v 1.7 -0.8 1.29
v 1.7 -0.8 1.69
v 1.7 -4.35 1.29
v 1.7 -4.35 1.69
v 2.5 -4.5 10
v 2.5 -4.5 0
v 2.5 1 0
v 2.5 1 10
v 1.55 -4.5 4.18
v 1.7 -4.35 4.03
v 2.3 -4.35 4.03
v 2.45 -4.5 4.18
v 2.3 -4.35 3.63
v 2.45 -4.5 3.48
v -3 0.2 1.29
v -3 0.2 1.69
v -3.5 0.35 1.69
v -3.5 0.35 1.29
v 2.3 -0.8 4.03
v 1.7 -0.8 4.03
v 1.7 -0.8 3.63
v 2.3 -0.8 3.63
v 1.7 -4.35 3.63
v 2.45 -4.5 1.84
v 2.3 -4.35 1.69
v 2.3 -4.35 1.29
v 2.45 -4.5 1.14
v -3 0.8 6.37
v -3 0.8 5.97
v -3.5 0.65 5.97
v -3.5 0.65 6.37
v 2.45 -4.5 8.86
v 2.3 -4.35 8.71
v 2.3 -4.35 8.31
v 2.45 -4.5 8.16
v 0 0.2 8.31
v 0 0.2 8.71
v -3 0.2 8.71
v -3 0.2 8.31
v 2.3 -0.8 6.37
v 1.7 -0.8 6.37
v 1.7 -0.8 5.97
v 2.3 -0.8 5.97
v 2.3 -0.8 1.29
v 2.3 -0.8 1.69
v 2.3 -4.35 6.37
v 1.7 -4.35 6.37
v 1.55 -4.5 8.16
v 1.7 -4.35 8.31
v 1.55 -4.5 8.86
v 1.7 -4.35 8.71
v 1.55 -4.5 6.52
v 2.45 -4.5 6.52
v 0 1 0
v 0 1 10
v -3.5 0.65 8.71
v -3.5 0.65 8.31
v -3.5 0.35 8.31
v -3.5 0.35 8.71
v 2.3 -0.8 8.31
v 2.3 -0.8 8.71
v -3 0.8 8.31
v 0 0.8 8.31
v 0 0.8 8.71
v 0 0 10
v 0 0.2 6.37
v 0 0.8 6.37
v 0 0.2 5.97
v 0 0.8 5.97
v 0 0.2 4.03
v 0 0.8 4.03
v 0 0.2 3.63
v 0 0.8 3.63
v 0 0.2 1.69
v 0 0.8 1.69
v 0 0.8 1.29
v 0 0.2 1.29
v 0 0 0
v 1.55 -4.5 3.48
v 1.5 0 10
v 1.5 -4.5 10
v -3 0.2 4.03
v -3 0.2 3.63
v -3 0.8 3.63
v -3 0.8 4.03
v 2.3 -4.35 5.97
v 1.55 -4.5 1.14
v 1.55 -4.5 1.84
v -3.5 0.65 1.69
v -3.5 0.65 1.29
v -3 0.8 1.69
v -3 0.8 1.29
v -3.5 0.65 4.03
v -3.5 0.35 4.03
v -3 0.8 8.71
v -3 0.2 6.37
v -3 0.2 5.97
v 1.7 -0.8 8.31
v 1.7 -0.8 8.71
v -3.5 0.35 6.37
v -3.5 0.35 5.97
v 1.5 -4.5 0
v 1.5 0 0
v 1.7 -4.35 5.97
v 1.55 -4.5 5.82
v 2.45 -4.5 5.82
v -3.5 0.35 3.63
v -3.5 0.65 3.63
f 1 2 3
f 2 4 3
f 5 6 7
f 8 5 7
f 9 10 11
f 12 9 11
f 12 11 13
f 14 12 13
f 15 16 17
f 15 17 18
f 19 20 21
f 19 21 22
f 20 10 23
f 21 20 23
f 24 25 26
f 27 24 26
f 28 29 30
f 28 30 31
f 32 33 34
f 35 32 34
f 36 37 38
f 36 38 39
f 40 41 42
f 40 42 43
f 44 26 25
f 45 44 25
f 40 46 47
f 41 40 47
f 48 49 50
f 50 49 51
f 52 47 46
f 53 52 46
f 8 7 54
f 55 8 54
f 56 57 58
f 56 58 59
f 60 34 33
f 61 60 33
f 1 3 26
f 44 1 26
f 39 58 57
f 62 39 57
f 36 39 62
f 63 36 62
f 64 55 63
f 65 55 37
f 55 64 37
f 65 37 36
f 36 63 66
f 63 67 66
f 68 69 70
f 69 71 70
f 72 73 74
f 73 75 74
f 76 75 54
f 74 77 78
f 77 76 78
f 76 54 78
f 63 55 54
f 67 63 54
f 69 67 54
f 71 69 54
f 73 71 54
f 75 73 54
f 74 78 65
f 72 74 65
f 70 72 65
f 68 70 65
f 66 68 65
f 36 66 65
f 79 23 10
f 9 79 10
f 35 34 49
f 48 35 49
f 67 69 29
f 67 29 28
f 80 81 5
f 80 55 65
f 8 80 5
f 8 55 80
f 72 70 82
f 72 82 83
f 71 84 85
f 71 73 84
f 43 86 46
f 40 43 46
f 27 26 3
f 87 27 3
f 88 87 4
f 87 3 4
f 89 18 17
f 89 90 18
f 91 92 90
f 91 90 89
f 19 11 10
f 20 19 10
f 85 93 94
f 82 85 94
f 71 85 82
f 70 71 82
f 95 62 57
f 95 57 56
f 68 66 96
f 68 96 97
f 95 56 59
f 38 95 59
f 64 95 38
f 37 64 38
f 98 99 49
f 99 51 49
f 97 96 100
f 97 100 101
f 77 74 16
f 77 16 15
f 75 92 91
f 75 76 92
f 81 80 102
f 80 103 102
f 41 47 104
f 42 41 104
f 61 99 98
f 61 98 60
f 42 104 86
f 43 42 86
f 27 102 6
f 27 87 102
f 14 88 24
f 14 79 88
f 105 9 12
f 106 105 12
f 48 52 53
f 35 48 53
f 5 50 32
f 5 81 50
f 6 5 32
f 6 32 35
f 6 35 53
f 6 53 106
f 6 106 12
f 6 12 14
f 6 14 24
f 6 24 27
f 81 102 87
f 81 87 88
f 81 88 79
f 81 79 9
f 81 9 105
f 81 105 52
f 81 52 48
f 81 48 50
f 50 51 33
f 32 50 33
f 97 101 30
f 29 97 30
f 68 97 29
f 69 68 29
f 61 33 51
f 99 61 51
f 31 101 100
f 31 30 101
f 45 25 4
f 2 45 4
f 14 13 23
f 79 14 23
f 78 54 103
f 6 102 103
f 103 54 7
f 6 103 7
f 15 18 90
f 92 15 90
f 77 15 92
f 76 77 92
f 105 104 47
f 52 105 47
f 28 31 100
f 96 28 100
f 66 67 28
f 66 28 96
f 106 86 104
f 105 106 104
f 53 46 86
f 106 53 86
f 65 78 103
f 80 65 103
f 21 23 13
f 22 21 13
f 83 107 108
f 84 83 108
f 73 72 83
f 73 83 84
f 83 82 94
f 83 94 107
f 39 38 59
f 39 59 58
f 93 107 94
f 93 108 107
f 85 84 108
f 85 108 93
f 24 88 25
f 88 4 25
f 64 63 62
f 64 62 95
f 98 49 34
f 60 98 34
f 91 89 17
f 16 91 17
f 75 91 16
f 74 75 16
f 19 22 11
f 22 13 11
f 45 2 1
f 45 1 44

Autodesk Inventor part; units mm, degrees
ref_plane "YZ Plane" through (0, 0, 0) normal (1, 0, 0) x (0, 1, 0)
ref_plane "XZ Plane" through (0, 0, 0) normal (0, 1, 0) x (-1, 0, 0)
ref_plane "XY Plane" through (0, 0, 0) normal (0, 0, 1) x (1, 0, 0)
sketch "Sketch4" plane through (0, 0, 0) normal (0, 0, 1) x (1, 0, 0)
  line L0 (0, 0) -> (1.5, 0)
  line L1 (1.5, 0) -> (1.5, -1)
  line L2 (1.5, -1) -> (2.5, -1)
  line L3 (2.5, -1) -> (2.5, 1)
  line L4 (2.5, 1) -> (0, 1)
  line L5 (0, 1) -> (0, 0)
  dimension "d22" = 1.5
  dimension "d23" = 1
  dimension "d24" = 1
  dimension "d25" = 2
extrude "Extrusion4" add sketch "Sketch4" along normal blind 10
sketch "Sketch5" plane through (1.5, -1, 0) normal (0, -1, 0) x (1, 0, 0)
  line L0 (0, 0) -> (1, 0) projected
  line L1 (1, 0) -> (1, 10) projected
  line L2 (0, 10) -> (1, 10) projected
  line L3 (0, 0) -> (0, 10) projected
  point P0 (-1.5, 0)
extrude "Extrusion5" add sketch "Sketch5" along normal blind 3.5
sketch "Sketch6" plane through (0, 0, 0) normal (-1, 0, 0) x (0, 0, 1)
  line L0 (0, 0) -> (10, 0) projected
  line L1 (1.29, 0.8) -> (1.69, 0.8)
  line L2 (1.69, 0.8) -> (1.69, 0.2)
  line L3 (1.69, 0.2) -> (1.29, 0.2)
  line L4 (1.29, 0.2) -> (1.29, 0.8)
  line L5 (3.63, 0.8) -> (4.03, 0.8)
  line L6 (4.03, 0.8) -> (4.03, 0.2)
  line L7 (4.03, 0.2) -> (3.63, 0.2)
  line L8 (3.63, 0.2) -> (3.63, 0.8)
  line L9 (5.97, 0.8) -> (6.37, 0.8)
  line L10 (6.37, 0.8) -> (6.37, 0.2)
  line L11 (6.37, 0.2) -> (5.97, 0.2)
  line L12 (5.97, 0.2) -> (5.97, 0.8)
  line L13 (0, 1) -> (0, 0) projected
  line L14 (10, 1) -> (10, 0) projected
  line L15 (8.31, 0.8) -> (8.71, 0.8)
  line L16 (8.71, 0.8) -> (8.71, 0.2)
  line L17 (8.71, 0.2) -> (8.31, 0.2)
  line L18 (8.31, 0.2) -> (8.31, 0.8)
  line L19 (0, 1) -> (10, 1) projected
  dimension "d30" = 0.4
  dimension "d31" = 0.6
  dimension "d32" = 0.4
  dimension "d33" = 0.6
  dimension "d36" = 0.4
  dimension "d37" = 0.6
  dimension "d38" = 1.94
  dimension "d40" = 0.2
  dimension "d41" = 0.2
  dimension "d42" = 0.2
  dimension "d49" = 1.29
  dimension "d50" = 1.94
  dimension "d51" = 0.4
  dimension "d52" = 0.6
  dimension "d53" = 0.2
  dimension "d54" = 1.94
  dimension "d55" = 1.29
  dimension "d80" = 0.2
extrude "Extrusion6" add sketch "Sketch6" along normal blind 3.5 contours L1 L2 L3 L4 | L5 L6 L7 L8 | L9 L10 L11 L12 | L15 L16 L17 L18
chamfer "Chamfer5" distance 0.15 distance2 0.5 1 edges at (-3.5, 0.2, 1.49) measured on face at (-3.5, 0.6, 1.4233)
chamfer "Chamfer6" distance 0.15 distance2 0.5 1 edges at (-3.5, 0.8, 1.49) measured on face at (-3.5, 0.65, 1.4233)
chamfer "Chamfer7" distance 0.15 distance2 0.5 1 edges at (-3.5, 0.2, 3.83) measured on face at (-3.5, 0.6, 3.7633)
chamfer "Chamfer8" distance 0.15 distance2 0.5 1 edges at (-3.5, 0.8, 3.83) measured on face at (-3.5, 0.65, 3.7633)
chamfer "Chamfer9" distance 0.15 distance2 0.5 1 edges at (-3.5, 0.2, 6.17) measured on face at (-3.5, 0.6, 6.1033)
chamfer "Chamfer10" distance 0.15 distance2 0.5 1 edges at (-3.5, 0.8, 6.17) measured on face at (-3.5, 0.65, 6.1033)
chamfer "Chamfer11" distance 0.15 distance2 0.5 1 edges at (-3.5, 0.8, 8.51) measured on face at (-3.5, 0.4, 8.5767)
chamfer "Chamfer12" distance 0.15 distance2 0.5 1 edges at (-3.5, 0.2, 8.51) measured on face at (-3.5, 0.35, 8.5767)
sketch "Sketch7" plane through (1.5, -4.5, 0) normal (0, -1, 0) x (1, 0, 0)
  line L0 (0, 10) -> (0, 0) projected
  line L1 (0.8, 8.71) -> (0.2, 8.71)
  line L2 (0.2, 8.71) -> (0.2, 8.31)
  line L3 (0.2, 8.31) -> (0.8, 8.31)
  line L4 (0.8, 8.31) -> (0.8, 8.71)
  line L5 (0.8, 6.37) -> (0.2, 6.37)
  line L6 (0.2, 6.37) -> (0.2, 5.97)
  line L7 (0.2, 5.97) -> (0.8, 5.97)
  line L8 (0.8, 5.97) -> (0.8, 6.37)
  line L9 (0.8, 4.03) -> (0.2, 4.03)
  line L10 (0.2, 4.03) -> (0.2, 3.63)
  line L11 (0.2, 3.63) -> (0.8, 3.63)
  line L12 (0.8, 3.63) -> (0.8, 4.03)
  line L13 (0.8, 1.69) -> (0.2, 1.69)
  line L14 (0.2, 1.69) -> (0.2, 1.29)
  line L15 (0.2, 1.29) -> (0.8, 1.29)
  line L16 (0.8, 1.29) -> (0.8, 1.69)
  point P0 (-1.5, 0)
  dimension "d81" = 0.6
  dimension "d82" = 0.4
  dimension "d83" = 0.4
  dimension "d84" = 0.4
  dimension "d85" = 0.4
  dimension "d86" = 0.2
extrude "Extrusion7" cut sketch "Sketch7" against normal blind 3.7
chamfer "Chamfer13" distance 0.15 angle 45 4 edges at (2, -4.5, 4.03) (2.3, -4.5, 3.83) (2, -4.5, 3.63) (1.7, -4.5, 3.83)
chamfer "Chamfer14" distance 0.15 angle 45 4 edges at (2, -4.5, 1.69) (2.3, -4.5, 1.49) (2, -4.5, 1.29) (1.7, -4.5, 1.49)
chamfer "Chamfer15" distance 0.15 angle 45 4 edges at (2.3, -4.5, 6.17) (2, -4.5, 6.37) (1.7, -4.5, 6.17) (2, -4.5, 5.97)
chamfer "Chamfer16" distance 0.15 angle 45 4 edges at (2, -4.5, 8.31) (2.3, -4.5, 8.51) (2, -4.5, 8.71) (1.7, -4.5, 8.51)
properties part number "Pin Connector Curved"
